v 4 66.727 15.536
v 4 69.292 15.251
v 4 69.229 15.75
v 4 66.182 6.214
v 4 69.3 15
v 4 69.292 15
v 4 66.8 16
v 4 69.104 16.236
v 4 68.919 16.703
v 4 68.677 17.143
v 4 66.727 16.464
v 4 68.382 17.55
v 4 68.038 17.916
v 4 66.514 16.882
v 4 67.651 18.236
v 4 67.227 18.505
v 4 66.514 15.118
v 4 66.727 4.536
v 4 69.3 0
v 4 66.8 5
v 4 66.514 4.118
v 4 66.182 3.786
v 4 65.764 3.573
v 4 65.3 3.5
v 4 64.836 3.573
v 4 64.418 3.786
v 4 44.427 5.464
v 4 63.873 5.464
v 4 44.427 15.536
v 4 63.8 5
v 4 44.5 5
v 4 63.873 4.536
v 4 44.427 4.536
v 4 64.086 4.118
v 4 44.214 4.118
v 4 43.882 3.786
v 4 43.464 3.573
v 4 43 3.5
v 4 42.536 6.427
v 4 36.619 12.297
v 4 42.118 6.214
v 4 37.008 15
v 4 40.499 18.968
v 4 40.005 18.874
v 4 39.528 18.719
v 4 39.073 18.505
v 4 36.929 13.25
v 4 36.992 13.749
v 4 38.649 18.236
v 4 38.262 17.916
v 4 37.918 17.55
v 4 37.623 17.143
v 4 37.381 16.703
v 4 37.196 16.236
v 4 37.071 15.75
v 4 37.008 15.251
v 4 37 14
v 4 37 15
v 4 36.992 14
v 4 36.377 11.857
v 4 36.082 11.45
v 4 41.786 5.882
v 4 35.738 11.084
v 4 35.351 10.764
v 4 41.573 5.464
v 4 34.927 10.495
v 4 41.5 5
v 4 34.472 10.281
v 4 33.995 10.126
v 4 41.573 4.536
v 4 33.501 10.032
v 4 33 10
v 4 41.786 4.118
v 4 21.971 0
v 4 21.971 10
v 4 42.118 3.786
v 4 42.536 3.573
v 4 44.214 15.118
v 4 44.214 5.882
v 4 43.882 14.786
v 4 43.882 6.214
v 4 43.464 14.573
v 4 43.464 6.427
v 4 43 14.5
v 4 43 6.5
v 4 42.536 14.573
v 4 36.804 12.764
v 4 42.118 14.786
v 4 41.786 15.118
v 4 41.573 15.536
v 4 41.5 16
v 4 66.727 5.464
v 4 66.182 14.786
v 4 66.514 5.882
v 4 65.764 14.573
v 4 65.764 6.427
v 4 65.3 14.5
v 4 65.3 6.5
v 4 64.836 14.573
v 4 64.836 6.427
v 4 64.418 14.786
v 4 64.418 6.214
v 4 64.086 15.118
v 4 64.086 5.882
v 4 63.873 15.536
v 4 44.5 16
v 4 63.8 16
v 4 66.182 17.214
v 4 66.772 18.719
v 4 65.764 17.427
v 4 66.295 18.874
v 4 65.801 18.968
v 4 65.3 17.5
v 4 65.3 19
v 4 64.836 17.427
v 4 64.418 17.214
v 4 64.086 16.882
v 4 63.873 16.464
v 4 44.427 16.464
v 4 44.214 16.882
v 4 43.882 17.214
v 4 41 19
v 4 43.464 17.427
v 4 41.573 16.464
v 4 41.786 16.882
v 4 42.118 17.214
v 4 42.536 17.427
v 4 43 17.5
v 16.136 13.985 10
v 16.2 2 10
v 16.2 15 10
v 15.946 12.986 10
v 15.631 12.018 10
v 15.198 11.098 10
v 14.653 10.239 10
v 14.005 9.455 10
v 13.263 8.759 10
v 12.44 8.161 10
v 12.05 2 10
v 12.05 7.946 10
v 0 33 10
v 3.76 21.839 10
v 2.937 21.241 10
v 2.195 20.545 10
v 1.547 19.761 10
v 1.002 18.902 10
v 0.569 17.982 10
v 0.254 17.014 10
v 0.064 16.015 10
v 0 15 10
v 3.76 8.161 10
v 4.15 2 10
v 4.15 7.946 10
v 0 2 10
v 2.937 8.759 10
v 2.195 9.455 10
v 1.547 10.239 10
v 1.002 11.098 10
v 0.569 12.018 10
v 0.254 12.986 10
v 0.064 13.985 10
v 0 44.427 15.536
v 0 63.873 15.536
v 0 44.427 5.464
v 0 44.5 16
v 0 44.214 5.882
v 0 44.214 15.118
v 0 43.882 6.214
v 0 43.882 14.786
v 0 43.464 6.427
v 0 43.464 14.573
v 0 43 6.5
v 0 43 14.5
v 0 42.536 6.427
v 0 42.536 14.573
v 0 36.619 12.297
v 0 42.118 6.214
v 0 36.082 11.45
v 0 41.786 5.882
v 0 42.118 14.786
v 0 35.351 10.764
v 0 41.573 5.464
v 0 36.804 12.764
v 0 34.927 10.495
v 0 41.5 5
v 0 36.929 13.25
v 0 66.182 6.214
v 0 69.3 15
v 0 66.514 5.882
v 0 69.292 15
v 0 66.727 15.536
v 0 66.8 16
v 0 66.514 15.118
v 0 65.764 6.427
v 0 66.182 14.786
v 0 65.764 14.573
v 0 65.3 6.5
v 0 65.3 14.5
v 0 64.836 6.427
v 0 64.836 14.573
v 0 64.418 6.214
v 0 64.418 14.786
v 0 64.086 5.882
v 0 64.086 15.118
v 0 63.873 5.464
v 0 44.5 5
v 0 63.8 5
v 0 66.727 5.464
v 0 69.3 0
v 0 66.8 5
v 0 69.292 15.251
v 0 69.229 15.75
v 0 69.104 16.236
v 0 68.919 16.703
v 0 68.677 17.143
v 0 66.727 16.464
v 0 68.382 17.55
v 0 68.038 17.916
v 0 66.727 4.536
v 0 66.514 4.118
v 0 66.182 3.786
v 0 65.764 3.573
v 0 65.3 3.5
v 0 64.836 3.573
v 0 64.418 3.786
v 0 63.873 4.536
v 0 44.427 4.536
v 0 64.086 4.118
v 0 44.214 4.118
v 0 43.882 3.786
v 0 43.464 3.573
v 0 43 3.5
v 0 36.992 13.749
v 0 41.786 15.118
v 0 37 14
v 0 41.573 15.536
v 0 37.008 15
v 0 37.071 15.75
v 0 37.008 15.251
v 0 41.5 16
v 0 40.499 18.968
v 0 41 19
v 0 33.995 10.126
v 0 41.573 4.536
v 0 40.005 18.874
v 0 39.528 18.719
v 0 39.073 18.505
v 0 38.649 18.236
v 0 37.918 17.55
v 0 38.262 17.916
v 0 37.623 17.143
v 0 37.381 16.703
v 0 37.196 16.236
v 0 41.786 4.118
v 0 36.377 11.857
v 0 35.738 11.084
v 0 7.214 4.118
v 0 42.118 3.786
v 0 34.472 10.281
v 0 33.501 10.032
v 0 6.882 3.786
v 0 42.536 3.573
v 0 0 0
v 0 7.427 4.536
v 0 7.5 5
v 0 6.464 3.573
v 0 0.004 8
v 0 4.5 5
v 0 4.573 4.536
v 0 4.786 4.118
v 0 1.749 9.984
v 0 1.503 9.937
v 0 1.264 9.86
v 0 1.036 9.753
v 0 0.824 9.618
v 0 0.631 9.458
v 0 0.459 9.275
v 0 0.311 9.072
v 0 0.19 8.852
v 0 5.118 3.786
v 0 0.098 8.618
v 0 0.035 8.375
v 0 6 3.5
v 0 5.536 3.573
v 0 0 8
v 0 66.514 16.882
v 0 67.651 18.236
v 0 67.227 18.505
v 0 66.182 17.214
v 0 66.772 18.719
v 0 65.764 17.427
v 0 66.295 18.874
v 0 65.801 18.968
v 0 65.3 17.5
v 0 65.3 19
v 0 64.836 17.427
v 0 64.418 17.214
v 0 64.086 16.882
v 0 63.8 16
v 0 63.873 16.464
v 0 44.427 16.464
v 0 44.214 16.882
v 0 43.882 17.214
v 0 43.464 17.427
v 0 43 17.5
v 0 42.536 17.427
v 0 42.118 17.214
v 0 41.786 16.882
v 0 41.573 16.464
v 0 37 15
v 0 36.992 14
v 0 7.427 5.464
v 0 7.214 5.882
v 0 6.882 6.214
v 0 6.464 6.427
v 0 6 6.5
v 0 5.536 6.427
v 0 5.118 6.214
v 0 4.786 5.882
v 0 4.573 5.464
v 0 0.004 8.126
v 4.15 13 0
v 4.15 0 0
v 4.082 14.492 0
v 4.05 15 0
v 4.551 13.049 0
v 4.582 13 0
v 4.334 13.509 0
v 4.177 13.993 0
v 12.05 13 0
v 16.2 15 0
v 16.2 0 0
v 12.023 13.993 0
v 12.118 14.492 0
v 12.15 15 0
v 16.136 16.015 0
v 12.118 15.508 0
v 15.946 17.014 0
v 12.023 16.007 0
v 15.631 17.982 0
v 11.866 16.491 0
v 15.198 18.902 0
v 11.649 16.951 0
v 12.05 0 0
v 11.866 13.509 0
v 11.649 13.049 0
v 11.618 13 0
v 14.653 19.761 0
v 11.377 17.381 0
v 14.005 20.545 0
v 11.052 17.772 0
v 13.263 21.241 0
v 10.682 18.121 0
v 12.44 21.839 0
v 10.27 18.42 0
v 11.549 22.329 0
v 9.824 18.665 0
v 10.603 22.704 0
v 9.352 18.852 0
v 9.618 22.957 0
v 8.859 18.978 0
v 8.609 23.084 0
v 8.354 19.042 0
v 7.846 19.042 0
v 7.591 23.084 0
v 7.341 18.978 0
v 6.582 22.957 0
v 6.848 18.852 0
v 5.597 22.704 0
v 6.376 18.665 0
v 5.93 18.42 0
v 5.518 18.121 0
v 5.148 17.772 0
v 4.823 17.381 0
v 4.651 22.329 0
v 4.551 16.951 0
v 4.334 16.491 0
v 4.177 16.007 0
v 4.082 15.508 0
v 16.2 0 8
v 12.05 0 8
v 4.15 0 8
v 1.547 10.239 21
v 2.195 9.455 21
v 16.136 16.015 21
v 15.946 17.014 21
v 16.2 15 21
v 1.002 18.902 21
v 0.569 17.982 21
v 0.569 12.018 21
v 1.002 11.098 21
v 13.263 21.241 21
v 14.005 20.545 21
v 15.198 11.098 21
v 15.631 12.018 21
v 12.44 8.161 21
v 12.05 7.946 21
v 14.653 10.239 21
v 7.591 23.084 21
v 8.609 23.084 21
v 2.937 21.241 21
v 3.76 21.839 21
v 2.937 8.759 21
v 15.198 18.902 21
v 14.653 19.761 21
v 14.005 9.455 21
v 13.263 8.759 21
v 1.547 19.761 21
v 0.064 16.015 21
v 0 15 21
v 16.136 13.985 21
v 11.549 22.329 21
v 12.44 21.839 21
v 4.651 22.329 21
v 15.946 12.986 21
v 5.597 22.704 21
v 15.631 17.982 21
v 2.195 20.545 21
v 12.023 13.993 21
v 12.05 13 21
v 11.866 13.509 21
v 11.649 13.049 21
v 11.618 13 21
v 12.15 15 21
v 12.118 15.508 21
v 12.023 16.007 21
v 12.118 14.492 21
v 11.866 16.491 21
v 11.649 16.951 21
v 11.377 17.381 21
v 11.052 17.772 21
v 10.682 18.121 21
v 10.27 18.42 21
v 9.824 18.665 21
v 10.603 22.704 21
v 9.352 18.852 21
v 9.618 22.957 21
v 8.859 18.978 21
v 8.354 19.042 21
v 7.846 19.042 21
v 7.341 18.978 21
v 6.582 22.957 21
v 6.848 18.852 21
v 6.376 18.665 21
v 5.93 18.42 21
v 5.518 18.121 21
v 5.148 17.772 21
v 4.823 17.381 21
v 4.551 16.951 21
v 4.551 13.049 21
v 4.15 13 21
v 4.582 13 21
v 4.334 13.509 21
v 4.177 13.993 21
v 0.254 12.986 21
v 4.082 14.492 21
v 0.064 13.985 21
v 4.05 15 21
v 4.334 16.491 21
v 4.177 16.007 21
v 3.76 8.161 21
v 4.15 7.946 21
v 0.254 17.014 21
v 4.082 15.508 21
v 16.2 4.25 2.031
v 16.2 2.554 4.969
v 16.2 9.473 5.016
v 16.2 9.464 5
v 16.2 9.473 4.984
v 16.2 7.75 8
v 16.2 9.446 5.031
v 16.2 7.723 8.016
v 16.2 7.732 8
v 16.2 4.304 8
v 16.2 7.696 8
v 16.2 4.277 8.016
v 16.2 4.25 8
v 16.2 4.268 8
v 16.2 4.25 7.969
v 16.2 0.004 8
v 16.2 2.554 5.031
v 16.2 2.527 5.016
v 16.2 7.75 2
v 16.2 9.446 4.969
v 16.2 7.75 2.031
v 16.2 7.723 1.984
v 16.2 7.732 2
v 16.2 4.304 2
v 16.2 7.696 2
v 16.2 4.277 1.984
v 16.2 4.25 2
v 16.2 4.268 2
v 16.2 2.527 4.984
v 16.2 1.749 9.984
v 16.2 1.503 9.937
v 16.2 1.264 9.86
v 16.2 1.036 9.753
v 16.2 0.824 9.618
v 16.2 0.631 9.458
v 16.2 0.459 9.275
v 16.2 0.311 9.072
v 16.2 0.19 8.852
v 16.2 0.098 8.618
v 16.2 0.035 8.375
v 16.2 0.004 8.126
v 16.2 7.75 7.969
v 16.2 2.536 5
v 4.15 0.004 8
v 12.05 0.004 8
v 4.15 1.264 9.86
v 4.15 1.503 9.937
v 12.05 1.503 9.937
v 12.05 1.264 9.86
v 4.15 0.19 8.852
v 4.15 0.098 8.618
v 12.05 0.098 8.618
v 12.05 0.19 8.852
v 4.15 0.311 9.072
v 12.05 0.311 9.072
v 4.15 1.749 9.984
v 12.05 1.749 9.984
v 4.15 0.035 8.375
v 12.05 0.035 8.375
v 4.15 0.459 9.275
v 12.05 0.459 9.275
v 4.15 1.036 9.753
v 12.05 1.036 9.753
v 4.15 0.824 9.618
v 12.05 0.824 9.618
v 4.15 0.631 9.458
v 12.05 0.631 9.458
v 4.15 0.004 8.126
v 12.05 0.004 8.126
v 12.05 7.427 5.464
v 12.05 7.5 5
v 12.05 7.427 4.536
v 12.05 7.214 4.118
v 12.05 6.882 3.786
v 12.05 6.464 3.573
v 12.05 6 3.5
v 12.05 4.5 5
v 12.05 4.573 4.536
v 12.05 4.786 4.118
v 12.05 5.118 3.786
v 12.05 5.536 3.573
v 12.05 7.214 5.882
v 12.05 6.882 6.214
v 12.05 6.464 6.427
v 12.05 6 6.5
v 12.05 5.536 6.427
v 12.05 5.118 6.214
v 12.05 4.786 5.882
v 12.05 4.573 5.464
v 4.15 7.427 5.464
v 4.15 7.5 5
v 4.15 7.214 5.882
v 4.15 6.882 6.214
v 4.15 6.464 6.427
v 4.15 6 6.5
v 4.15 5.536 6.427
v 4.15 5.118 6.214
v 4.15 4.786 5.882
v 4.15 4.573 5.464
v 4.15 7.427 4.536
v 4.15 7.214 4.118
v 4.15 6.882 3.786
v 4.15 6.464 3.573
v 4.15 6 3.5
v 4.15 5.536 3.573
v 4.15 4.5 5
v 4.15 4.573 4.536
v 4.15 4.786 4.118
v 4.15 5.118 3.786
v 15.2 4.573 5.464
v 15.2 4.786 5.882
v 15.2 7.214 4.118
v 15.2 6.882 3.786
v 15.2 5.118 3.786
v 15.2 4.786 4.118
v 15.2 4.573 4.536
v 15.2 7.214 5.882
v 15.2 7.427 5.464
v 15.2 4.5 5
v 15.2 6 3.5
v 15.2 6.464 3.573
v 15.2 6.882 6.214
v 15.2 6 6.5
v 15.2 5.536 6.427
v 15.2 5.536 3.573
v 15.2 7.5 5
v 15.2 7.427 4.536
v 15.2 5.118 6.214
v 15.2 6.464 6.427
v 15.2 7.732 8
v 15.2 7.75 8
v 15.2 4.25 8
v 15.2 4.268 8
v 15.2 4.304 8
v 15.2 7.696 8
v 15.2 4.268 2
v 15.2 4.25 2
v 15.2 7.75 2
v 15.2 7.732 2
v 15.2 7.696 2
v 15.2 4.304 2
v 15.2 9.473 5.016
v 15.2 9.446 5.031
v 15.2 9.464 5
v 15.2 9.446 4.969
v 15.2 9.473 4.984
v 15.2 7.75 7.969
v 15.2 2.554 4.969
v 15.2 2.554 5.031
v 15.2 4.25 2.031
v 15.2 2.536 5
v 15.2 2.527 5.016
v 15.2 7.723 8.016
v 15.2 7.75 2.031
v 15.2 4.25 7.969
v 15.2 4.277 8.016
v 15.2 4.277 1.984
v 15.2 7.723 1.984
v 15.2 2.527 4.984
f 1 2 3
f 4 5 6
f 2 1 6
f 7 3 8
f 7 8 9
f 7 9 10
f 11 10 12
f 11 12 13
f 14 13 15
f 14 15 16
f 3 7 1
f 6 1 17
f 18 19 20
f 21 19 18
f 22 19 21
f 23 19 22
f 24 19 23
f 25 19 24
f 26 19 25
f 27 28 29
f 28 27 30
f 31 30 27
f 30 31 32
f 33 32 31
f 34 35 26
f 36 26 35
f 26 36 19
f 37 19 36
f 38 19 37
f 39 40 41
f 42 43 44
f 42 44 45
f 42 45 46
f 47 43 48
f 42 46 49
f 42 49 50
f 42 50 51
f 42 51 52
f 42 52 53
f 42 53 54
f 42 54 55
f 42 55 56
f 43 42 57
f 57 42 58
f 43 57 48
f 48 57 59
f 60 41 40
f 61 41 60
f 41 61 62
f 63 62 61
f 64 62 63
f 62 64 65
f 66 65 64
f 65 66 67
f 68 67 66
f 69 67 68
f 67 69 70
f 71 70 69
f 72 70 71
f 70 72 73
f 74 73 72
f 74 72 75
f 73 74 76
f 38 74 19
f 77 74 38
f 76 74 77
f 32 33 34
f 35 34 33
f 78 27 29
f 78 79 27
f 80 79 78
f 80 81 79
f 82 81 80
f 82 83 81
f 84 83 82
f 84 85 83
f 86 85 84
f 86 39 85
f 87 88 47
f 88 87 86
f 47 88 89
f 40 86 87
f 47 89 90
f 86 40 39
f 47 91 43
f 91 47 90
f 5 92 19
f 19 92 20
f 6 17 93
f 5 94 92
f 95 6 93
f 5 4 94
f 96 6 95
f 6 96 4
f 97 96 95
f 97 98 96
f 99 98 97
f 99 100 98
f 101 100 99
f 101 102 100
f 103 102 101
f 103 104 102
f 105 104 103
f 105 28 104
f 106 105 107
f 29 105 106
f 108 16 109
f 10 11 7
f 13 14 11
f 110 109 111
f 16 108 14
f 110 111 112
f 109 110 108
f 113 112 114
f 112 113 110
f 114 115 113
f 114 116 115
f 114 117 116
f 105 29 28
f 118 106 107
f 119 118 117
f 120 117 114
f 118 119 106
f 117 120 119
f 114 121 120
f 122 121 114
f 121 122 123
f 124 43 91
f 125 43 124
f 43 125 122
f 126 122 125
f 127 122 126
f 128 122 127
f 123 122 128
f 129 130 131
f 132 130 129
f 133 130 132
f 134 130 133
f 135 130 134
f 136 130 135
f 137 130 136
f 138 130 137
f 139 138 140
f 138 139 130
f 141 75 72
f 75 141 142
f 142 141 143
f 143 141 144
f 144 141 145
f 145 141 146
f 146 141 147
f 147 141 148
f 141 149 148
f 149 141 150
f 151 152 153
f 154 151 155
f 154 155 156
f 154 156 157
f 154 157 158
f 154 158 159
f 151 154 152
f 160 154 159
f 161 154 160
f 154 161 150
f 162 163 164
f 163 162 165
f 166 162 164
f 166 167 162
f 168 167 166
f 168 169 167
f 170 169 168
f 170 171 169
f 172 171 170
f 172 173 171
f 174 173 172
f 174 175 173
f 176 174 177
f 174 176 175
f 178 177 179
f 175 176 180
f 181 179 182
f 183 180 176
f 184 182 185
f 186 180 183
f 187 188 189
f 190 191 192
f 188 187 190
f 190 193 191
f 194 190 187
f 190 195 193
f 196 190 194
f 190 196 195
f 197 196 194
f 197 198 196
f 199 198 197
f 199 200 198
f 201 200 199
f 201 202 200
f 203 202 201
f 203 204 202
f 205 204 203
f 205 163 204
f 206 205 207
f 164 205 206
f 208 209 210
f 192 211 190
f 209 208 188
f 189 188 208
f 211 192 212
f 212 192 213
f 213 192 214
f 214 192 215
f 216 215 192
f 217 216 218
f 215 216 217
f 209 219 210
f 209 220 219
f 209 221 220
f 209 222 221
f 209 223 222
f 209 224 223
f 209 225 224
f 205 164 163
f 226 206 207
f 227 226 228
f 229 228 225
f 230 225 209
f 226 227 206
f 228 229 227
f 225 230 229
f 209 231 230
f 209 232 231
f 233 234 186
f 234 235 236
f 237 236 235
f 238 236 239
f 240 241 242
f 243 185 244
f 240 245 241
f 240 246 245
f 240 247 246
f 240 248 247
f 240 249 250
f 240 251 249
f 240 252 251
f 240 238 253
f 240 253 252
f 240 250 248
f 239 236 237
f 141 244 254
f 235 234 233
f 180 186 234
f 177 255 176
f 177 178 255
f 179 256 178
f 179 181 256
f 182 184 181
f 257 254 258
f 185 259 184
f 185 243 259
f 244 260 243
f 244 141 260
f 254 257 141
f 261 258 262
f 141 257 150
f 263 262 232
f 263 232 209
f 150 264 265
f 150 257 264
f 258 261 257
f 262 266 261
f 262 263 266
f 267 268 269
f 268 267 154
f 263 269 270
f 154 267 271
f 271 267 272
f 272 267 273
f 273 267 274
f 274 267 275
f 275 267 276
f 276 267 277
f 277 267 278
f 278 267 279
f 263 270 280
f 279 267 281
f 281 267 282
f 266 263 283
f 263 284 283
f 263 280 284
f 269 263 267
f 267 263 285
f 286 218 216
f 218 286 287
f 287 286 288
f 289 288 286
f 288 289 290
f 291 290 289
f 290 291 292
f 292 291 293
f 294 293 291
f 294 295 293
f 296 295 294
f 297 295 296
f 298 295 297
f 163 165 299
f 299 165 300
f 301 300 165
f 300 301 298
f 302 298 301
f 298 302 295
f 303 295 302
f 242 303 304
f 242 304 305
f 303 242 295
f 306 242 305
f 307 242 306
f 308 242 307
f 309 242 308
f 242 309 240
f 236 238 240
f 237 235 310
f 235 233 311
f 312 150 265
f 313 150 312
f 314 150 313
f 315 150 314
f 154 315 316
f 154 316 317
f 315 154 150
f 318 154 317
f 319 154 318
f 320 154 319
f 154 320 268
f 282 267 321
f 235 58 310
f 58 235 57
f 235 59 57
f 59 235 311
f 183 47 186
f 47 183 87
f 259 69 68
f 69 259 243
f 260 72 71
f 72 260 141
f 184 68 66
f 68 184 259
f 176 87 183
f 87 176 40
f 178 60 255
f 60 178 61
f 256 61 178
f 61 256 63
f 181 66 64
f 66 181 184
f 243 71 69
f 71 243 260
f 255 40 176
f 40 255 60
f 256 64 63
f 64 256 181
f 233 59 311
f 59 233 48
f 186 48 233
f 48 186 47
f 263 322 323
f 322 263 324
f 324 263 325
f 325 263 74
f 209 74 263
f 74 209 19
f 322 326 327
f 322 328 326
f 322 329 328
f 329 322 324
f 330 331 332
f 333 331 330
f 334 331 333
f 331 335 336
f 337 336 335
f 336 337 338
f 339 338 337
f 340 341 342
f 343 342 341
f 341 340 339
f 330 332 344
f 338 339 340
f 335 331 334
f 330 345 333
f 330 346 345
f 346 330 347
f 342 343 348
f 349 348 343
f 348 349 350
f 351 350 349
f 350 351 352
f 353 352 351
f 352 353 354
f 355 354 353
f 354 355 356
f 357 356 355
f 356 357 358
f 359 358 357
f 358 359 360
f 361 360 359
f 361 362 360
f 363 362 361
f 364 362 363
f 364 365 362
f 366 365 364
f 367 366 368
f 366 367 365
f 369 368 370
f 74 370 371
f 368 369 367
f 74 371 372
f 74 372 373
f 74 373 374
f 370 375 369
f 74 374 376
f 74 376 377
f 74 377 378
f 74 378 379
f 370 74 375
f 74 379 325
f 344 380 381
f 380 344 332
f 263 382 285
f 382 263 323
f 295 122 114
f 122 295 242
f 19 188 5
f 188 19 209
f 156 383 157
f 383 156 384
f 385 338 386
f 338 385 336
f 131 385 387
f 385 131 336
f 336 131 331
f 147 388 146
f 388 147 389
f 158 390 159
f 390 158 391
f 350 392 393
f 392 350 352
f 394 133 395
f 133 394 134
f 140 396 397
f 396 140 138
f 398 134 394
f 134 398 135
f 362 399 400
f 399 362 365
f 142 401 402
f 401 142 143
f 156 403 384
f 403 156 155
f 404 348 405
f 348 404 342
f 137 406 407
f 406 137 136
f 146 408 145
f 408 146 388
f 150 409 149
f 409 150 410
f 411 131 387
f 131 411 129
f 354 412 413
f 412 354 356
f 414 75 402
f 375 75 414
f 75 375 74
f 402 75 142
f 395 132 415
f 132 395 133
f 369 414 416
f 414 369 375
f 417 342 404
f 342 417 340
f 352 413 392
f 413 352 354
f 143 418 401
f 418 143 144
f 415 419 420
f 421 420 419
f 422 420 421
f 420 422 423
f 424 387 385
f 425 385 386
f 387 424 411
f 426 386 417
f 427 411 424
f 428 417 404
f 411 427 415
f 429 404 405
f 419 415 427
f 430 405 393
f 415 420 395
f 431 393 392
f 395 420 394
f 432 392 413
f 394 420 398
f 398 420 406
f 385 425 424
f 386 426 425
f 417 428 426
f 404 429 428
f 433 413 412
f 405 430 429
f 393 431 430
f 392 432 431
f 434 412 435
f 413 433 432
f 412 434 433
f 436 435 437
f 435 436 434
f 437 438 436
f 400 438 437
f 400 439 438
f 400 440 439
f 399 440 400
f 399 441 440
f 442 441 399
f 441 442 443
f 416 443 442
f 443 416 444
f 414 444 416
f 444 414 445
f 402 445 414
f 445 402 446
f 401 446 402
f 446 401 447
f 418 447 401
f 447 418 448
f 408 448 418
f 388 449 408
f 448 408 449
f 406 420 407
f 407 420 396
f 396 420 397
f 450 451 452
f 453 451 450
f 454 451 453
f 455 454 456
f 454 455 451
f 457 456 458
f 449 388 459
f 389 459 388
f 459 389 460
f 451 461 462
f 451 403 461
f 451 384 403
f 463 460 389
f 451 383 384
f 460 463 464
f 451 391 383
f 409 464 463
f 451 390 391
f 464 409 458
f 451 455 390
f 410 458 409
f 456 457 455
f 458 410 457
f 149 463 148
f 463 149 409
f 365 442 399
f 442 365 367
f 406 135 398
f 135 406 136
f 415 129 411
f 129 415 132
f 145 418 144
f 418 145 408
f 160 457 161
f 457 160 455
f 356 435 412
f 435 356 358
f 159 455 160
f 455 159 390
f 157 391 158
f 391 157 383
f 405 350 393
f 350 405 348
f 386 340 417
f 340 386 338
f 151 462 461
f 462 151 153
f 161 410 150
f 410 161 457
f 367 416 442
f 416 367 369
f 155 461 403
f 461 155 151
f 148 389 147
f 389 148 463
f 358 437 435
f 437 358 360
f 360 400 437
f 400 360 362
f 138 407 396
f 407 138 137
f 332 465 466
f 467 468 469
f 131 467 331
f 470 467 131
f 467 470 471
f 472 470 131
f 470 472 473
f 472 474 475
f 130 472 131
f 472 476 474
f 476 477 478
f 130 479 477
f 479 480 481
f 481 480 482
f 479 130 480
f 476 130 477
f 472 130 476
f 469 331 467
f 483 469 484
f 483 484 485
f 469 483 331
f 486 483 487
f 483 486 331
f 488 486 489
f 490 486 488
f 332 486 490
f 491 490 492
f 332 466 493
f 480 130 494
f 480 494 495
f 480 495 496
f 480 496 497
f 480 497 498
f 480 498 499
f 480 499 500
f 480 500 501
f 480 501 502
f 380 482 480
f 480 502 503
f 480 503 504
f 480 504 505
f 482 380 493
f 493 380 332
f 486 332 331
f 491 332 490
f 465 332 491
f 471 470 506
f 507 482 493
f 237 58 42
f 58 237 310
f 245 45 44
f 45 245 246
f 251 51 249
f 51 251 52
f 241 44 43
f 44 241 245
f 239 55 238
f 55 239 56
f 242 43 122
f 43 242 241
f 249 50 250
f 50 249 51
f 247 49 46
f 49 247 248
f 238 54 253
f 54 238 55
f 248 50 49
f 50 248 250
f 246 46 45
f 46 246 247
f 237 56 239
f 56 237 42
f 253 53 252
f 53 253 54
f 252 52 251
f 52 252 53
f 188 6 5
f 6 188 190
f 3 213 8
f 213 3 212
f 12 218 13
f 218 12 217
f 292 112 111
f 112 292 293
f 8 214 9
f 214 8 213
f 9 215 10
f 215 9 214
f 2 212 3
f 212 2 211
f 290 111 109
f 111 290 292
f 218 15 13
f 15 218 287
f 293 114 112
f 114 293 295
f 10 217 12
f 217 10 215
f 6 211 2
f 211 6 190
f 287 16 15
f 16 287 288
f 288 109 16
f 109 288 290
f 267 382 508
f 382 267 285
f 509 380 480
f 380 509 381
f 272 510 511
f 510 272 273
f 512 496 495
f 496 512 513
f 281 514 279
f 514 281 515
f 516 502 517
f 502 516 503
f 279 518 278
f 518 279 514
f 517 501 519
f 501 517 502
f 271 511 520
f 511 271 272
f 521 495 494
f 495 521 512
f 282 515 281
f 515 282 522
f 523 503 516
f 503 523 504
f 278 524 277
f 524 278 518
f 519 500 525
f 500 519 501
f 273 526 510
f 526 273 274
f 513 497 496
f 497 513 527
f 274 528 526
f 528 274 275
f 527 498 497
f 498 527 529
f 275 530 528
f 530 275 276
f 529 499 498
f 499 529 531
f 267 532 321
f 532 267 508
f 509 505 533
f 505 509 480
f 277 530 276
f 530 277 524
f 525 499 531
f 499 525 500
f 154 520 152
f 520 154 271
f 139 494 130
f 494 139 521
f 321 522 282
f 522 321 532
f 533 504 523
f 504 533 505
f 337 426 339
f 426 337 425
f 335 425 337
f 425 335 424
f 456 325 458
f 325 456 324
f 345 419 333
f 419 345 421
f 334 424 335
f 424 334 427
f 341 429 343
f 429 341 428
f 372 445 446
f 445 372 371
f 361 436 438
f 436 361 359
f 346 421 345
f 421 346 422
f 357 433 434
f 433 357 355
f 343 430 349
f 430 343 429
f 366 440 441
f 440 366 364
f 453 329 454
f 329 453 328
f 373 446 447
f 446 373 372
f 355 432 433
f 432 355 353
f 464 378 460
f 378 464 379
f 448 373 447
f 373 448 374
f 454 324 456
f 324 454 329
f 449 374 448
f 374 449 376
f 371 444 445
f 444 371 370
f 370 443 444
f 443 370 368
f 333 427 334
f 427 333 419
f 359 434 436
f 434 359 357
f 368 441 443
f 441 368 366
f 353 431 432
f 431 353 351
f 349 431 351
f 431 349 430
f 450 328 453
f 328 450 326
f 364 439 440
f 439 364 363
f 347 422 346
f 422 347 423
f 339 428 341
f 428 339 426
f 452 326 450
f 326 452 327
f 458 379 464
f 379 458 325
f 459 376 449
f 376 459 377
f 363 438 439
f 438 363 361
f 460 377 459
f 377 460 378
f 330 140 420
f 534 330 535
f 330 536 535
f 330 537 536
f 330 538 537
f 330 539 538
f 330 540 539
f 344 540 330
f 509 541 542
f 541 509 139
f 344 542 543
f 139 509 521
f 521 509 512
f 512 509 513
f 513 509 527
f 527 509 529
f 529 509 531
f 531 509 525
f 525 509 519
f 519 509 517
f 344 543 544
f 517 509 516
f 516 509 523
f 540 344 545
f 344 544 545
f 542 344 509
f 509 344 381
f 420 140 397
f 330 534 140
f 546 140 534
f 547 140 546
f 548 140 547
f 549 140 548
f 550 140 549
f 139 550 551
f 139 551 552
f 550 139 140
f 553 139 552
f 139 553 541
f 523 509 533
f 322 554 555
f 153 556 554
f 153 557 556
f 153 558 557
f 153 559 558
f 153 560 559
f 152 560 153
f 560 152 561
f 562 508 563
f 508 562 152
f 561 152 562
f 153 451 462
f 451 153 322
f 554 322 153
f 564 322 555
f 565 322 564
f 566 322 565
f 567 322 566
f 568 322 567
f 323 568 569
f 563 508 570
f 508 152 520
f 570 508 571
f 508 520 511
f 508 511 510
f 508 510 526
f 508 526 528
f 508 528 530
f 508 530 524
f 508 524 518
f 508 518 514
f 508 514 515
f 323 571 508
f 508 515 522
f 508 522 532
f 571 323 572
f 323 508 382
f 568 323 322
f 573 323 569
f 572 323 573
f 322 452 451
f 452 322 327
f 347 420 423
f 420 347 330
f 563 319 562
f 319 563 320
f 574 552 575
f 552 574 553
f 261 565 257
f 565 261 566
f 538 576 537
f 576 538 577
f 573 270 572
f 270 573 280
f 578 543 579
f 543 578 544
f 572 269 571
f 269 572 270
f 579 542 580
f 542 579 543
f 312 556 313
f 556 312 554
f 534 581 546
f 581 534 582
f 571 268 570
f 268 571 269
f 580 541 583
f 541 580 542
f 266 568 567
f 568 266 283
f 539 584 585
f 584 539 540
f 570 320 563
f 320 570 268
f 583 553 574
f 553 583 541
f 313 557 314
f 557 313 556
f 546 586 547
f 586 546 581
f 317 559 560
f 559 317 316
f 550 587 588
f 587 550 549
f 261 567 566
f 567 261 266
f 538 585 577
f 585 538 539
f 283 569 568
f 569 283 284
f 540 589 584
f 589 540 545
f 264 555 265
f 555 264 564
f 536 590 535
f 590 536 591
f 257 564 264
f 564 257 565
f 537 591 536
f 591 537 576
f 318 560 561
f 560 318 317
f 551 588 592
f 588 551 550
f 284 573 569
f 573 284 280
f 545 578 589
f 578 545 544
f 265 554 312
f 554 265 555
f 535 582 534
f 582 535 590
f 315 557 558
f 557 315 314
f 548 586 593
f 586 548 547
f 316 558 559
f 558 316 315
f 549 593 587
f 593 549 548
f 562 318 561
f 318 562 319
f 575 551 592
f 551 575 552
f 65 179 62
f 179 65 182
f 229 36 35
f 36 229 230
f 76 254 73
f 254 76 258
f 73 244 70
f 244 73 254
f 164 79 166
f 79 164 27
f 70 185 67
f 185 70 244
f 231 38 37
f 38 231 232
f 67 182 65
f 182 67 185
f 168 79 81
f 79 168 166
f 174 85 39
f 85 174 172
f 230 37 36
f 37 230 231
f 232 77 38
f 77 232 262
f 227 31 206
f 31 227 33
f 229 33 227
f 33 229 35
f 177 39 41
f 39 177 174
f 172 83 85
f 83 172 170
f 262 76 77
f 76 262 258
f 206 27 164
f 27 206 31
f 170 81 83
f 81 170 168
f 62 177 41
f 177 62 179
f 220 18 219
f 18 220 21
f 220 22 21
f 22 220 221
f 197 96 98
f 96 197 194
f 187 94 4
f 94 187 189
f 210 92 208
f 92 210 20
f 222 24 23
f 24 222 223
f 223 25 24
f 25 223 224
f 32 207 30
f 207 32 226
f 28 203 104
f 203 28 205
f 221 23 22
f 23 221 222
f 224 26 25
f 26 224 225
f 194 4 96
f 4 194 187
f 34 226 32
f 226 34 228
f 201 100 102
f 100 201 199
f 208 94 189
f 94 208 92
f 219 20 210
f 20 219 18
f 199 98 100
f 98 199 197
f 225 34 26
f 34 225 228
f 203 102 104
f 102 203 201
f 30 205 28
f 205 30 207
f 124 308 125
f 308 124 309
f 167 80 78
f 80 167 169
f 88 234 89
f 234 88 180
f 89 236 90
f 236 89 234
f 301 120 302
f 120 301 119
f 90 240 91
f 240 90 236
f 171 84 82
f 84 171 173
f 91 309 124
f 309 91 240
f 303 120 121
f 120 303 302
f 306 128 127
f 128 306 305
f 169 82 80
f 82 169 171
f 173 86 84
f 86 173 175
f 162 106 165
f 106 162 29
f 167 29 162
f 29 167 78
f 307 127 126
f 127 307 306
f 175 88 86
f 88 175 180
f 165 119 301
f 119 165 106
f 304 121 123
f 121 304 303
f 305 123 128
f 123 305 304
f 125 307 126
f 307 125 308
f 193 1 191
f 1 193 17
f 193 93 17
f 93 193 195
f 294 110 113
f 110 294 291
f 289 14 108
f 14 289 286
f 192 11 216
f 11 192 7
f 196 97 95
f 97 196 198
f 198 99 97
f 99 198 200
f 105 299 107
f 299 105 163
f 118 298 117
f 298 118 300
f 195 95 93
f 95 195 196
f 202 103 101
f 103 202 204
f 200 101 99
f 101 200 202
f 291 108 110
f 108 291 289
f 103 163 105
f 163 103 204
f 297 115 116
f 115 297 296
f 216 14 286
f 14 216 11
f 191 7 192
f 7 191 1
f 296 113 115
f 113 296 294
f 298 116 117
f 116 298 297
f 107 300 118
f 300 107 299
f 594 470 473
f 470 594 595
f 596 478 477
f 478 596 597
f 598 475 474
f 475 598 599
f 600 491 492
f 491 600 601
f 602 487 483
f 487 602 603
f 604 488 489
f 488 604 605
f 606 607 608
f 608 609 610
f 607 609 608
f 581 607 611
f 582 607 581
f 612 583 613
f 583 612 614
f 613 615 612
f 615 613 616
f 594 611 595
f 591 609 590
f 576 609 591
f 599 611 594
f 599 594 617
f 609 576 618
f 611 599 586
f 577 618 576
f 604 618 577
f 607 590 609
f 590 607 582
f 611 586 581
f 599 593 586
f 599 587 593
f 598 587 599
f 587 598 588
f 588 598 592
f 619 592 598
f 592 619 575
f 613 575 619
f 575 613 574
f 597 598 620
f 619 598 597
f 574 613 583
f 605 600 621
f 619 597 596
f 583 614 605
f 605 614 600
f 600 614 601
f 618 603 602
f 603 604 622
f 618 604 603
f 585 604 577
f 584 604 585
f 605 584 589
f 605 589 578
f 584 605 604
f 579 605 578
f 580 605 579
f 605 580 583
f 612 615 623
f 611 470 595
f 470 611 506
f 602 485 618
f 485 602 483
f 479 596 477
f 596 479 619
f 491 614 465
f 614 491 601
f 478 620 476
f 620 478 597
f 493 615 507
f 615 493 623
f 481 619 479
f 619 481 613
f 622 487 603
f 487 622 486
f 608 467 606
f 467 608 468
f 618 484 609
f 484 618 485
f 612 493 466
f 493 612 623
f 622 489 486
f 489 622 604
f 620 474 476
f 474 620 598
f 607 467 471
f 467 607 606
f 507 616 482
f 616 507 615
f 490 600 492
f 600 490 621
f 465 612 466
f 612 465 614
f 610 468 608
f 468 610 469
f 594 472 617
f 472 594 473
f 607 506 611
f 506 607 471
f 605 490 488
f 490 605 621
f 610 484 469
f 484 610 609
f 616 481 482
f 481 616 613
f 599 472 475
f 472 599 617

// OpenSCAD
/* [Holes Spacing] */

vertical = 11;
horizontal = 22.3;

holes_offset = 15;

hole_radius = 1.5;

axel_radius = 8.1;

axel_support_height = 21;

difference() {
	union() {
		cube([4,23++holes_offset,10]);  //4,45,10
        translate([0,22+holes_offset,0]) cube([4,10+horizontal,8+vertical]);
		translate([axel_radius, 15,0]) cylinder(h = axel_support_height, r = axel_radius, $fn = 50);
        cube([axel_radius*2, 15,10]);
		
    
        
        color("Blue",0.4);
        //bevel([0,22,20],4,20,1);
       add_bottom_right([0,22+holes_offset,10],4,4);

	}
       bevel_top_left([0,22+holes_offset,8+vertical],4,100);
       bevel_top_right([0,32+horizontal+holes_offset,8+vertical],4,100);
       bevel_top_left([0,0,10],2,100);


	translate([axel_radius, 15,0]) cylinder(h = axel_support_height, r = axel_radius/2, $fn = 50);
	translate([axel_radius/2+0.1, 0, 0]) cube([axel_radius-0.2, 13,axel_support_height]);
	translate([-10, 6, 5]) rotate(a=[0, 90, 0]) cylinder(h = 200, r = hole_radius, $fn= 20);
    
    //holes
	translate([-10, 28+holes_offset, 5]) rotate(a=[0, 90, 0]) cylinder(h = 30, r = hole_radius, $fn= 20);
	translate([-10, 28+horizontal+holes_offset, 5]) rotate(a=[0, 90, 0]) cylinder(h = 30, r = hole_radius, $fn= 20);
    translate([-10, 28+holes_offset, 5+vertical]) rotate(a=[0, 90, 0]) cylinder(h = 30, r = hole_radius, $fn= 20);
	translate([-10, 28+horizontal+holes_offset, 5+vertical]) rotate(a=[0, 90, 0]) cylinder(h = 30, r = hole_radius, $fn= 20);
    
	translate([axel_radius*2,6,5]) cube([2,3.5,6], center=true);
	translate([axel_radius*2,6,5]) rotate(a=[60,0,0]) cube([2,3.5,6], center=true);
	translate([axel_radius*2,6,5]) rotate(a=[120,0,0]) cube([2,3.5,6], center=true);
}

module bevel1(pos=[0,0,0],radius=2,depth=10) {
    difference() {
        difference () {
            translate([0,0,radius*2]) cube([depth,radius*2,radius*2]);
            translate([0,radius,0-radius]) rotate(a=[0, 90, 0]) cylinder(h = depth, r = radius, $fn= 20);
        }
       // translate([0,radius,0-radius*2]) cube([depth,radius,radius*2]);
         //translate([0,0,0-radius*2]) cube([depth,radius*2,radius]);
    }
}

module bevel_top_left(pos=[0,0,0],radius=20,depth=10) {
    bevel(pos,radius,depth,[1,-1],[-1,0]);
}
module bevel_top_right(pos=[0,0,0],radius=20,depth=10) {
    bevel(pos,radius,depth,[-1,-1],[0,0]);
}

module add_bottom_right(pos=[0,0,0],radius=20,depth=10) {
    bevel(pos,radius,depth,[-1,1],[0,-1]);
}

module bevel(pos=[0,0,0],radius=20,depth=10,factor=[1,-1],t=[-1,0]) {
    
    translate([pos[0],pos[1]+radius*factor[0],pos[2]+radius*factor[1]])
    difference(){
        difference(){
            translate([0,-radius,-radius]) cube([depth,radius*2,radius*2]);
            difference(){
                translate([0,-radius,-radius]) cube([depth,radius*2,radius*2]);
                translate([0,radius*t[0],radius*t[1]]) cube([depth,radius,radius]);
            }
        }
        rotate(a=[0, 90, 0]) cylinder(h = depth, r = radius, $fn= 50);
    }
}
